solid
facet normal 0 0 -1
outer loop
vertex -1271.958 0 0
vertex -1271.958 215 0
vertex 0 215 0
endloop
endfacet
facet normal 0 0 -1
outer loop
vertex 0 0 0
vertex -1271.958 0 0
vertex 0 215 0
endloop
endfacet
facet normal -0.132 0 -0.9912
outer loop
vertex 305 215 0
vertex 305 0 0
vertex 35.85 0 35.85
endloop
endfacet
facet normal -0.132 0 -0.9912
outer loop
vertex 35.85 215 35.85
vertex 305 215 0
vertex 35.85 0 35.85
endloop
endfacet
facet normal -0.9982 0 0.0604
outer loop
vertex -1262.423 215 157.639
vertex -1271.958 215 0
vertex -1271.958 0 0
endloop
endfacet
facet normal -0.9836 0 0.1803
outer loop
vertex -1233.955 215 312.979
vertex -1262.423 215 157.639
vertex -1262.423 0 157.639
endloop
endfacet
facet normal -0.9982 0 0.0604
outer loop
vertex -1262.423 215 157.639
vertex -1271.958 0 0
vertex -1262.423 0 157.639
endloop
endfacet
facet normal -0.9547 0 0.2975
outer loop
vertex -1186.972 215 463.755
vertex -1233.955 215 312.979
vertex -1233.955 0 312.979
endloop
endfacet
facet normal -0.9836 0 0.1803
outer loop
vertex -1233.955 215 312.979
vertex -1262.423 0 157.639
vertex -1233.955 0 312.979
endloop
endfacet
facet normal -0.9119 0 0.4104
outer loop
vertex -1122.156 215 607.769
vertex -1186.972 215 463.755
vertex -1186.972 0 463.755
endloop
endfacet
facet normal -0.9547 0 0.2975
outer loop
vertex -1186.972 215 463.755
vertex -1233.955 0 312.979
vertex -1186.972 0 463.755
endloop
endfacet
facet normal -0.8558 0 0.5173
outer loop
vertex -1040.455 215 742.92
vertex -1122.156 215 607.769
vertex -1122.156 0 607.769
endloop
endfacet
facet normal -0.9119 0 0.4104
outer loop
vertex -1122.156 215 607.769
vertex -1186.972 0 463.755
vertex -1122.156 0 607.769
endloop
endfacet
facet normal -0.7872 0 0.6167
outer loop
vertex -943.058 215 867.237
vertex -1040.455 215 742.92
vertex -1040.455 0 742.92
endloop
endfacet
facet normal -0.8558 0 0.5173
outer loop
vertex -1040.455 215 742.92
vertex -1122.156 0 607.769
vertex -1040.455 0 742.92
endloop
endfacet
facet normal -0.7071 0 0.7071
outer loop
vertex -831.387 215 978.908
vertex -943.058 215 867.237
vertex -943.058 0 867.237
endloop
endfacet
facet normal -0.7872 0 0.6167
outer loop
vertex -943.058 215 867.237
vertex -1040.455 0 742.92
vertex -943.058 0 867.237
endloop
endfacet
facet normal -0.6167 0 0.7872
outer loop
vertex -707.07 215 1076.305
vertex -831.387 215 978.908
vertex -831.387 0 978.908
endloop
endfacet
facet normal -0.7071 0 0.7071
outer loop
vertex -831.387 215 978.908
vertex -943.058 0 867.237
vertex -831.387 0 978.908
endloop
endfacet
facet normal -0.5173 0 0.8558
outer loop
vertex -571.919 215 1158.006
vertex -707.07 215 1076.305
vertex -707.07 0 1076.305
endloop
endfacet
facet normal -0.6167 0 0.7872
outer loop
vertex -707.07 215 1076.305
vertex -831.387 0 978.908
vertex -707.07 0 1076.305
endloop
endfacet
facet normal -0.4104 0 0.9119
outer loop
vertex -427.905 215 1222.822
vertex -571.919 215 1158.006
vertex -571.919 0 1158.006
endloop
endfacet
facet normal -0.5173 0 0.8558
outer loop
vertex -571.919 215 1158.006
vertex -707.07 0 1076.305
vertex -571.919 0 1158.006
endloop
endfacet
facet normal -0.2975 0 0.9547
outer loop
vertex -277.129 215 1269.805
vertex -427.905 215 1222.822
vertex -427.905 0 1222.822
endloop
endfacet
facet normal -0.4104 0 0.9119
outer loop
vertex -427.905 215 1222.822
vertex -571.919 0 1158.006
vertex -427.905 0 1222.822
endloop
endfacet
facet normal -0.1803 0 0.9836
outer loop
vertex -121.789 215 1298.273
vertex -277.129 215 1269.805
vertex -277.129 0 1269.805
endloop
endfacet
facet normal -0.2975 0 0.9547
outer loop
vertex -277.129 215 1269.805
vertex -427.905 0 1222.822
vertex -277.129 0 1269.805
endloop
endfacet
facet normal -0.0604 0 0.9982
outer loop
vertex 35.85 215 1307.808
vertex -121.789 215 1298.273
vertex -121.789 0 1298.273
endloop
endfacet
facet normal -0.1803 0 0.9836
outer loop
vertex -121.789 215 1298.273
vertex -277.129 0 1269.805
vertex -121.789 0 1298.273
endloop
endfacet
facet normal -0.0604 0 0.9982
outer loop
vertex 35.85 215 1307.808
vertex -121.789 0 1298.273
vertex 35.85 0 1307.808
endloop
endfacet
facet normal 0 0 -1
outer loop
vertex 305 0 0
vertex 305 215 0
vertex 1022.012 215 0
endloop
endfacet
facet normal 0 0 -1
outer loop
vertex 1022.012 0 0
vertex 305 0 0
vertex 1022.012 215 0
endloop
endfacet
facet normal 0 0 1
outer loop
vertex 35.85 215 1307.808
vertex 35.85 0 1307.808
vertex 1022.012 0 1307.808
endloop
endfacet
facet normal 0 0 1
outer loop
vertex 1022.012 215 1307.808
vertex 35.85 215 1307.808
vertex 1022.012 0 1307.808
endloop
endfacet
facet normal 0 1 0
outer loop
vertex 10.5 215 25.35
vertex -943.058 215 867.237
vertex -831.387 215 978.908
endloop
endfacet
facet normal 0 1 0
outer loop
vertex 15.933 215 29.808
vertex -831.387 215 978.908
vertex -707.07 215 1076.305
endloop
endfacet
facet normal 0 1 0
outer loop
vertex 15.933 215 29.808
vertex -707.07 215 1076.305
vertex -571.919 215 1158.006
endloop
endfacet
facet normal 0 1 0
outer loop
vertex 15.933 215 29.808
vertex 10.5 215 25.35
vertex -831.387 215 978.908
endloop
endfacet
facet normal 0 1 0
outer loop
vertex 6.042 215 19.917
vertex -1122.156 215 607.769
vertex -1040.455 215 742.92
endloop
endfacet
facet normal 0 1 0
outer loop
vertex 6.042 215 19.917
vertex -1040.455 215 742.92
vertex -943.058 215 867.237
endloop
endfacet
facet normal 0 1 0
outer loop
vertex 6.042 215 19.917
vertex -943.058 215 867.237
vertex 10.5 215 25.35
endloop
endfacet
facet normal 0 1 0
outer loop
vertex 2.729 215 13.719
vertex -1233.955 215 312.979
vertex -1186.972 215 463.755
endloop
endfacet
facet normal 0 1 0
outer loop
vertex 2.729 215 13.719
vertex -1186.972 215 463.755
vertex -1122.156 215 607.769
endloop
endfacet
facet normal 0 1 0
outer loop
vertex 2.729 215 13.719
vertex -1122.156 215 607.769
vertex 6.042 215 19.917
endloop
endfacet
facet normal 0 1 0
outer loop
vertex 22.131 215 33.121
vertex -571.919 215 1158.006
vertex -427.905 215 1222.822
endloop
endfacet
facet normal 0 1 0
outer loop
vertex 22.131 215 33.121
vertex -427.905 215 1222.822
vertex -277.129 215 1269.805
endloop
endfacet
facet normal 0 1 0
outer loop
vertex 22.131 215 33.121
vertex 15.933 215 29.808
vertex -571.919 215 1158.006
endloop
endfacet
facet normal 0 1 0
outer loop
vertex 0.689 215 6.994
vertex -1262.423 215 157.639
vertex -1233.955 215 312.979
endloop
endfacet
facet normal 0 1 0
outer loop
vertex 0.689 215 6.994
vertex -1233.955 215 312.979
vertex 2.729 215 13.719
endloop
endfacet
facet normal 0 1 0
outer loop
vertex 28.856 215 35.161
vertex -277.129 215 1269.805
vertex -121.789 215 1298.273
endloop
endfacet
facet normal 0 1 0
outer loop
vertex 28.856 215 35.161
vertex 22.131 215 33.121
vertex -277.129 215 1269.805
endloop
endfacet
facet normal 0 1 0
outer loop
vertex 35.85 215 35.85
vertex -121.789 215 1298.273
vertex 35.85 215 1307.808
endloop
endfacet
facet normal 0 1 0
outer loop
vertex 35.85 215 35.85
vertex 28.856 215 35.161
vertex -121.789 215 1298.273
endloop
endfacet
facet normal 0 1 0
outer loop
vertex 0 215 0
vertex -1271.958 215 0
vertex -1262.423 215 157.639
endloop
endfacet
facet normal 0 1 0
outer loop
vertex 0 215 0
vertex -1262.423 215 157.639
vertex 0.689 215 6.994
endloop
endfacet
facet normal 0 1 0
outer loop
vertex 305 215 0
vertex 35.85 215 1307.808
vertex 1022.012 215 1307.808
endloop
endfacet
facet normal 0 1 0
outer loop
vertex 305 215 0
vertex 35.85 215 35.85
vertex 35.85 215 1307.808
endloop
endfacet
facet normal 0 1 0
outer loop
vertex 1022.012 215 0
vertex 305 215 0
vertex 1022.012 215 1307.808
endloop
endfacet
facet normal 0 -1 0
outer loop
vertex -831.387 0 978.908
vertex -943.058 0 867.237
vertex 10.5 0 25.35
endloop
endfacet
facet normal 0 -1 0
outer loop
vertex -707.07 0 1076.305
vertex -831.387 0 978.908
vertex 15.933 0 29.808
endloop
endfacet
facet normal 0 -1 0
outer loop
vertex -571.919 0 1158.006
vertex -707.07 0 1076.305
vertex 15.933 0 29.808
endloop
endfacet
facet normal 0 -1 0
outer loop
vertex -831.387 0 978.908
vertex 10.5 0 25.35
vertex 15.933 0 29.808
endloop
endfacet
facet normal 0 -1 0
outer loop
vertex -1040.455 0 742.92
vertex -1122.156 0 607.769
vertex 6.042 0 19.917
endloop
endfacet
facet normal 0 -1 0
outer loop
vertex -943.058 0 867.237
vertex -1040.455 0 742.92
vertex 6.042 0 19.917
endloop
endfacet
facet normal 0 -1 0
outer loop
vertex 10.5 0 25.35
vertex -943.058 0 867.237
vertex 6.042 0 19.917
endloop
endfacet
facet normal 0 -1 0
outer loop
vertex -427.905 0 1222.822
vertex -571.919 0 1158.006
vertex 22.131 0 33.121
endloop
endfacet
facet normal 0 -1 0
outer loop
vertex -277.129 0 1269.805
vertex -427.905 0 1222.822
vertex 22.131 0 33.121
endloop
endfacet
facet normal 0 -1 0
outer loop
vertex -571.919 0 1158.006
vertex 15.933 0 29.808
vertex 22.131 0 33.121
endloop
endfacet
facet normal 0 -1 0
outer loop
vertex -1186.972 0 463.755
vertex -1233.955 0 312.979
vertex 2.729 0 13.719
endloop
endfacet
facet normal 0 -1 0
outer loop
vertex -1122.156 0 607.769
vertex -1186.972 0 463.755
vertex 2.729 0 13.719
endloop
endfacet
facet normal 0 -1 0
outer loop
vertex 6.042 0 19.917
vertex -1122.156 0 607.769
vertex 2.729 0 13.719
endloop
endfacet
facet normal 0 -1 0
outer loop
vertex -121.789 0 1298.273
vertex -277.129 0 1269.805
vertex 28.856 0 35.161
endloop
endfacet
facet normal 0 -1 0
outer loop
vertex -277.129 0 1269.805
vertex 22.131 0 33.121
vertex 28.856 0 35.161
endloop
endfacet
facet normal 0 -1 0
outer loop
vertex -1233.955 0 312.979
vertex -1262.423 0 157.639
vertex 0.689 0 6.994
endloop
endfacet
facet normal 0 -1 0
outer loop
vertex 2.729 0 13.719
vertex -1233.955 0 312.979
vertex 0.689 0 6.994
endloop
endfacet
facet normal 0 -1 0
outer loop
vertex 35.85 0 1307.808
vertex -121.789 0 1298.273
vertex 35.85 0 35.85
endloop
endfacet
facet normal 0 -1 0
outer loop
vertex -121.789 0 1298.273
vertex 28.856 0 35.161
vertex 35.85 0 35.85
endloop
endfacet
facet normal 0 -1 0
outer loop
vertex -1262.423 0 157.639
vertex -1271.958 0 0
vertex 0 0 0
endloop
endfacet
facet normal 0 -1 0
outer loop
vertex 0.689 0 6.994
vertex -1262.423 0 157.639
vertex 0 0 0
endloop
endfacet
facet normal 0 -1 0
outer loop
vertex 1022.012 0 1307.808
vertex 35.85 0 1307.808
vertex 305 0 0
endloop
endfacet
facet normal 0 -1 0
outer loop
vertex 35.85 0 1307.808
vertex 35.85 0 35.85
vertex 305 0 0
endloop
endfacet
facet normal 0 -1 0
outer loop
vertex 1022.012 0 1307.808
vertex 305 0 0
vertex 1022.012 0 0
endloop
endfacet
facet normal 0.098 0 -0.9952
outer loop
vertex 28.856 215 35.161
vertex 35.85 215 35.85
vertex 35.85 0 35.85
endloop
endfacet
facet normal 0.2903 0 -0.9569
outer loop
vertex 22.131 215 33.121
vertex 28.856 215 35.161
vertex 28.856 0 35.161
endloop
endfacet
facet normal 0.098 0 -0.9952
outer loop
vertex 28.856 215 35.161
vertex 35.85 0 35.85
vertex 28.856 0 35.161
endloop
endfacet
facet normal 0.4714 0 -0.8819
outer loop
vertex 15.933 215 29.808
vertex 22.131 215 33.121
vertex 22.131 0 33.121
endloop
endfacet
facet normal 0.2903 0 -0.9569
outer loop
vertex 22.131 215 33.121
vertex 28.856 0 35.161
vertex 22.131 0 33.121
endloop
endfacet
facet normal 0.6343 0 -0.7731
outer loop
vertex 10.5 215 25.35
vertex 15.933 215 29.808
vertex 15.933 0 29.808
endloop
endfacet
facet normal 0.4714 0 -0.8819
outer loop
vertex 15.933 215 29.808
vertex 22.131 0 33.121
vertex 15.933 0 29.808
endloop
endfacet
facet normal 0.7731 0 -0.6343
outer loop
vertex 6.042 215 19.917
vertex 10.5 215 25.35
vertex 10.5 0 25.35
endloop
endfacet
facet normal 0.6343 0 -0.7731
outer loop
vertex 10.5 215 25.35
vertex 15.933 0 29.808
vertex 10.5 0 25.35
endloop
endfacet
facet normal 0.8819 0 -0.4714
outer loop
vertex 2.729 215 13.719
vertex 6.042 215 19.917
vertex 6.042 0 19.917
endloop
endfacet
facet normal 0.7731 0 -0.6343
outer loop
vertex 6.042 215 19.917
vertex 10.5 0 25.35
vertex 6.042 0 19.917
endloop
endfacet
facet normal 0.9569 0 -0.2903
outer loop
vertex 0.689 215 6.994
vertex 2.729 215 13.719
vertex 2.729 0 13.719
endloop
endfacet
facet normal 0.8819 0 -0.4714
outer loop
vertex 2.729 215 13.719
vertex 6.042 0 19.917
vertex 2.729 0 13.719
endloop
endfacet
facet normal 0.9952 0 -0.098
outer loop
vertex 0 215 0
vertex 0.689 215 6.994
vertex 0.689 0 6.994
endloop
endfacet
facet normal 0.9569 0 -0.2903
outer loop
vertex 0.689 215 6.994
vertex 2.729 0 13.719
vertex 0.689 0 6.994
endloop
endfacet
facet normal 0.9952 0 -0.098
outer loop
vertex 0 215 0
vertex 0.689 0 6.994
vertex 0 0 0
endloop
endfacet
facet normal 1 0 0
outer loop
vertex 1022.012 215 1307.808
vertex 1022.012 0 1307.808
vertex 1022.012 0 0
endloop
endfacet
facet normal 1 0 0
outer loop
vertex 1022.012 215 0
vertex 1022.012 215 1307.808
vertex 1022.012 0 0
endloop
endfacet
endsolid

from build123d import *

# Parameters (mm, degrees)
THICKEN1_DEPTH     = 215
SKETCH5_W          = 2293.9698
SKETCH5_H          = 1307.808
CUT_EXTRUDE1_DEPTH = 1837.971398424


# Read off the part's stored shape, not the designer's step: Thicken1
with BuildPart() as part:
    # Thicken1 outline → Thicken1 (new body)
    with BuildSketch(Plane(origin=(0, 0, 0), x_dir=(1, 0, 0), z_dir=(0, 1, 0))):
        with BuildLine():
            Line((35.85, -1307.808), (1022.0118, -1307.808))
            Line((1022.0118, -1307.808), (1022.0118, 1307.808))
            Line((1022.0118, 1307.808), (35.85, 1307.808))
            ThreePointArc((35.85, 1307.808), (-1271.958, 0), (35.85, -1307.808))
        make_face()
        with BuildLine():
            Line((305, 0), (35.85, -35.85))
            ThreePointArc((35.85, -35.85), (0, 0), (35.85, 35.85))
            Line((35.85, 35.85), (305, 0))
        make_face(mode=Mode.SUBTRACT)
    extrude(amount=THICKEN1_DEPTH)

    # Sketch5 → Cut-Extrude1 (cut, through all)
    with BuildSketch(Plane(origin=(0, 215, 0), x_dir=(1, 0, 0), z_dir=(0, 1, 0))):
        with Locations((-124.9731, 653.904)):
            Rectangle(SKETCH5_W, SKETCH5_H)
    extrude(amount=-CUT_EXTRUDE1_DEPTH, mode=Mode.SUBTRACT)


solid = part.part
